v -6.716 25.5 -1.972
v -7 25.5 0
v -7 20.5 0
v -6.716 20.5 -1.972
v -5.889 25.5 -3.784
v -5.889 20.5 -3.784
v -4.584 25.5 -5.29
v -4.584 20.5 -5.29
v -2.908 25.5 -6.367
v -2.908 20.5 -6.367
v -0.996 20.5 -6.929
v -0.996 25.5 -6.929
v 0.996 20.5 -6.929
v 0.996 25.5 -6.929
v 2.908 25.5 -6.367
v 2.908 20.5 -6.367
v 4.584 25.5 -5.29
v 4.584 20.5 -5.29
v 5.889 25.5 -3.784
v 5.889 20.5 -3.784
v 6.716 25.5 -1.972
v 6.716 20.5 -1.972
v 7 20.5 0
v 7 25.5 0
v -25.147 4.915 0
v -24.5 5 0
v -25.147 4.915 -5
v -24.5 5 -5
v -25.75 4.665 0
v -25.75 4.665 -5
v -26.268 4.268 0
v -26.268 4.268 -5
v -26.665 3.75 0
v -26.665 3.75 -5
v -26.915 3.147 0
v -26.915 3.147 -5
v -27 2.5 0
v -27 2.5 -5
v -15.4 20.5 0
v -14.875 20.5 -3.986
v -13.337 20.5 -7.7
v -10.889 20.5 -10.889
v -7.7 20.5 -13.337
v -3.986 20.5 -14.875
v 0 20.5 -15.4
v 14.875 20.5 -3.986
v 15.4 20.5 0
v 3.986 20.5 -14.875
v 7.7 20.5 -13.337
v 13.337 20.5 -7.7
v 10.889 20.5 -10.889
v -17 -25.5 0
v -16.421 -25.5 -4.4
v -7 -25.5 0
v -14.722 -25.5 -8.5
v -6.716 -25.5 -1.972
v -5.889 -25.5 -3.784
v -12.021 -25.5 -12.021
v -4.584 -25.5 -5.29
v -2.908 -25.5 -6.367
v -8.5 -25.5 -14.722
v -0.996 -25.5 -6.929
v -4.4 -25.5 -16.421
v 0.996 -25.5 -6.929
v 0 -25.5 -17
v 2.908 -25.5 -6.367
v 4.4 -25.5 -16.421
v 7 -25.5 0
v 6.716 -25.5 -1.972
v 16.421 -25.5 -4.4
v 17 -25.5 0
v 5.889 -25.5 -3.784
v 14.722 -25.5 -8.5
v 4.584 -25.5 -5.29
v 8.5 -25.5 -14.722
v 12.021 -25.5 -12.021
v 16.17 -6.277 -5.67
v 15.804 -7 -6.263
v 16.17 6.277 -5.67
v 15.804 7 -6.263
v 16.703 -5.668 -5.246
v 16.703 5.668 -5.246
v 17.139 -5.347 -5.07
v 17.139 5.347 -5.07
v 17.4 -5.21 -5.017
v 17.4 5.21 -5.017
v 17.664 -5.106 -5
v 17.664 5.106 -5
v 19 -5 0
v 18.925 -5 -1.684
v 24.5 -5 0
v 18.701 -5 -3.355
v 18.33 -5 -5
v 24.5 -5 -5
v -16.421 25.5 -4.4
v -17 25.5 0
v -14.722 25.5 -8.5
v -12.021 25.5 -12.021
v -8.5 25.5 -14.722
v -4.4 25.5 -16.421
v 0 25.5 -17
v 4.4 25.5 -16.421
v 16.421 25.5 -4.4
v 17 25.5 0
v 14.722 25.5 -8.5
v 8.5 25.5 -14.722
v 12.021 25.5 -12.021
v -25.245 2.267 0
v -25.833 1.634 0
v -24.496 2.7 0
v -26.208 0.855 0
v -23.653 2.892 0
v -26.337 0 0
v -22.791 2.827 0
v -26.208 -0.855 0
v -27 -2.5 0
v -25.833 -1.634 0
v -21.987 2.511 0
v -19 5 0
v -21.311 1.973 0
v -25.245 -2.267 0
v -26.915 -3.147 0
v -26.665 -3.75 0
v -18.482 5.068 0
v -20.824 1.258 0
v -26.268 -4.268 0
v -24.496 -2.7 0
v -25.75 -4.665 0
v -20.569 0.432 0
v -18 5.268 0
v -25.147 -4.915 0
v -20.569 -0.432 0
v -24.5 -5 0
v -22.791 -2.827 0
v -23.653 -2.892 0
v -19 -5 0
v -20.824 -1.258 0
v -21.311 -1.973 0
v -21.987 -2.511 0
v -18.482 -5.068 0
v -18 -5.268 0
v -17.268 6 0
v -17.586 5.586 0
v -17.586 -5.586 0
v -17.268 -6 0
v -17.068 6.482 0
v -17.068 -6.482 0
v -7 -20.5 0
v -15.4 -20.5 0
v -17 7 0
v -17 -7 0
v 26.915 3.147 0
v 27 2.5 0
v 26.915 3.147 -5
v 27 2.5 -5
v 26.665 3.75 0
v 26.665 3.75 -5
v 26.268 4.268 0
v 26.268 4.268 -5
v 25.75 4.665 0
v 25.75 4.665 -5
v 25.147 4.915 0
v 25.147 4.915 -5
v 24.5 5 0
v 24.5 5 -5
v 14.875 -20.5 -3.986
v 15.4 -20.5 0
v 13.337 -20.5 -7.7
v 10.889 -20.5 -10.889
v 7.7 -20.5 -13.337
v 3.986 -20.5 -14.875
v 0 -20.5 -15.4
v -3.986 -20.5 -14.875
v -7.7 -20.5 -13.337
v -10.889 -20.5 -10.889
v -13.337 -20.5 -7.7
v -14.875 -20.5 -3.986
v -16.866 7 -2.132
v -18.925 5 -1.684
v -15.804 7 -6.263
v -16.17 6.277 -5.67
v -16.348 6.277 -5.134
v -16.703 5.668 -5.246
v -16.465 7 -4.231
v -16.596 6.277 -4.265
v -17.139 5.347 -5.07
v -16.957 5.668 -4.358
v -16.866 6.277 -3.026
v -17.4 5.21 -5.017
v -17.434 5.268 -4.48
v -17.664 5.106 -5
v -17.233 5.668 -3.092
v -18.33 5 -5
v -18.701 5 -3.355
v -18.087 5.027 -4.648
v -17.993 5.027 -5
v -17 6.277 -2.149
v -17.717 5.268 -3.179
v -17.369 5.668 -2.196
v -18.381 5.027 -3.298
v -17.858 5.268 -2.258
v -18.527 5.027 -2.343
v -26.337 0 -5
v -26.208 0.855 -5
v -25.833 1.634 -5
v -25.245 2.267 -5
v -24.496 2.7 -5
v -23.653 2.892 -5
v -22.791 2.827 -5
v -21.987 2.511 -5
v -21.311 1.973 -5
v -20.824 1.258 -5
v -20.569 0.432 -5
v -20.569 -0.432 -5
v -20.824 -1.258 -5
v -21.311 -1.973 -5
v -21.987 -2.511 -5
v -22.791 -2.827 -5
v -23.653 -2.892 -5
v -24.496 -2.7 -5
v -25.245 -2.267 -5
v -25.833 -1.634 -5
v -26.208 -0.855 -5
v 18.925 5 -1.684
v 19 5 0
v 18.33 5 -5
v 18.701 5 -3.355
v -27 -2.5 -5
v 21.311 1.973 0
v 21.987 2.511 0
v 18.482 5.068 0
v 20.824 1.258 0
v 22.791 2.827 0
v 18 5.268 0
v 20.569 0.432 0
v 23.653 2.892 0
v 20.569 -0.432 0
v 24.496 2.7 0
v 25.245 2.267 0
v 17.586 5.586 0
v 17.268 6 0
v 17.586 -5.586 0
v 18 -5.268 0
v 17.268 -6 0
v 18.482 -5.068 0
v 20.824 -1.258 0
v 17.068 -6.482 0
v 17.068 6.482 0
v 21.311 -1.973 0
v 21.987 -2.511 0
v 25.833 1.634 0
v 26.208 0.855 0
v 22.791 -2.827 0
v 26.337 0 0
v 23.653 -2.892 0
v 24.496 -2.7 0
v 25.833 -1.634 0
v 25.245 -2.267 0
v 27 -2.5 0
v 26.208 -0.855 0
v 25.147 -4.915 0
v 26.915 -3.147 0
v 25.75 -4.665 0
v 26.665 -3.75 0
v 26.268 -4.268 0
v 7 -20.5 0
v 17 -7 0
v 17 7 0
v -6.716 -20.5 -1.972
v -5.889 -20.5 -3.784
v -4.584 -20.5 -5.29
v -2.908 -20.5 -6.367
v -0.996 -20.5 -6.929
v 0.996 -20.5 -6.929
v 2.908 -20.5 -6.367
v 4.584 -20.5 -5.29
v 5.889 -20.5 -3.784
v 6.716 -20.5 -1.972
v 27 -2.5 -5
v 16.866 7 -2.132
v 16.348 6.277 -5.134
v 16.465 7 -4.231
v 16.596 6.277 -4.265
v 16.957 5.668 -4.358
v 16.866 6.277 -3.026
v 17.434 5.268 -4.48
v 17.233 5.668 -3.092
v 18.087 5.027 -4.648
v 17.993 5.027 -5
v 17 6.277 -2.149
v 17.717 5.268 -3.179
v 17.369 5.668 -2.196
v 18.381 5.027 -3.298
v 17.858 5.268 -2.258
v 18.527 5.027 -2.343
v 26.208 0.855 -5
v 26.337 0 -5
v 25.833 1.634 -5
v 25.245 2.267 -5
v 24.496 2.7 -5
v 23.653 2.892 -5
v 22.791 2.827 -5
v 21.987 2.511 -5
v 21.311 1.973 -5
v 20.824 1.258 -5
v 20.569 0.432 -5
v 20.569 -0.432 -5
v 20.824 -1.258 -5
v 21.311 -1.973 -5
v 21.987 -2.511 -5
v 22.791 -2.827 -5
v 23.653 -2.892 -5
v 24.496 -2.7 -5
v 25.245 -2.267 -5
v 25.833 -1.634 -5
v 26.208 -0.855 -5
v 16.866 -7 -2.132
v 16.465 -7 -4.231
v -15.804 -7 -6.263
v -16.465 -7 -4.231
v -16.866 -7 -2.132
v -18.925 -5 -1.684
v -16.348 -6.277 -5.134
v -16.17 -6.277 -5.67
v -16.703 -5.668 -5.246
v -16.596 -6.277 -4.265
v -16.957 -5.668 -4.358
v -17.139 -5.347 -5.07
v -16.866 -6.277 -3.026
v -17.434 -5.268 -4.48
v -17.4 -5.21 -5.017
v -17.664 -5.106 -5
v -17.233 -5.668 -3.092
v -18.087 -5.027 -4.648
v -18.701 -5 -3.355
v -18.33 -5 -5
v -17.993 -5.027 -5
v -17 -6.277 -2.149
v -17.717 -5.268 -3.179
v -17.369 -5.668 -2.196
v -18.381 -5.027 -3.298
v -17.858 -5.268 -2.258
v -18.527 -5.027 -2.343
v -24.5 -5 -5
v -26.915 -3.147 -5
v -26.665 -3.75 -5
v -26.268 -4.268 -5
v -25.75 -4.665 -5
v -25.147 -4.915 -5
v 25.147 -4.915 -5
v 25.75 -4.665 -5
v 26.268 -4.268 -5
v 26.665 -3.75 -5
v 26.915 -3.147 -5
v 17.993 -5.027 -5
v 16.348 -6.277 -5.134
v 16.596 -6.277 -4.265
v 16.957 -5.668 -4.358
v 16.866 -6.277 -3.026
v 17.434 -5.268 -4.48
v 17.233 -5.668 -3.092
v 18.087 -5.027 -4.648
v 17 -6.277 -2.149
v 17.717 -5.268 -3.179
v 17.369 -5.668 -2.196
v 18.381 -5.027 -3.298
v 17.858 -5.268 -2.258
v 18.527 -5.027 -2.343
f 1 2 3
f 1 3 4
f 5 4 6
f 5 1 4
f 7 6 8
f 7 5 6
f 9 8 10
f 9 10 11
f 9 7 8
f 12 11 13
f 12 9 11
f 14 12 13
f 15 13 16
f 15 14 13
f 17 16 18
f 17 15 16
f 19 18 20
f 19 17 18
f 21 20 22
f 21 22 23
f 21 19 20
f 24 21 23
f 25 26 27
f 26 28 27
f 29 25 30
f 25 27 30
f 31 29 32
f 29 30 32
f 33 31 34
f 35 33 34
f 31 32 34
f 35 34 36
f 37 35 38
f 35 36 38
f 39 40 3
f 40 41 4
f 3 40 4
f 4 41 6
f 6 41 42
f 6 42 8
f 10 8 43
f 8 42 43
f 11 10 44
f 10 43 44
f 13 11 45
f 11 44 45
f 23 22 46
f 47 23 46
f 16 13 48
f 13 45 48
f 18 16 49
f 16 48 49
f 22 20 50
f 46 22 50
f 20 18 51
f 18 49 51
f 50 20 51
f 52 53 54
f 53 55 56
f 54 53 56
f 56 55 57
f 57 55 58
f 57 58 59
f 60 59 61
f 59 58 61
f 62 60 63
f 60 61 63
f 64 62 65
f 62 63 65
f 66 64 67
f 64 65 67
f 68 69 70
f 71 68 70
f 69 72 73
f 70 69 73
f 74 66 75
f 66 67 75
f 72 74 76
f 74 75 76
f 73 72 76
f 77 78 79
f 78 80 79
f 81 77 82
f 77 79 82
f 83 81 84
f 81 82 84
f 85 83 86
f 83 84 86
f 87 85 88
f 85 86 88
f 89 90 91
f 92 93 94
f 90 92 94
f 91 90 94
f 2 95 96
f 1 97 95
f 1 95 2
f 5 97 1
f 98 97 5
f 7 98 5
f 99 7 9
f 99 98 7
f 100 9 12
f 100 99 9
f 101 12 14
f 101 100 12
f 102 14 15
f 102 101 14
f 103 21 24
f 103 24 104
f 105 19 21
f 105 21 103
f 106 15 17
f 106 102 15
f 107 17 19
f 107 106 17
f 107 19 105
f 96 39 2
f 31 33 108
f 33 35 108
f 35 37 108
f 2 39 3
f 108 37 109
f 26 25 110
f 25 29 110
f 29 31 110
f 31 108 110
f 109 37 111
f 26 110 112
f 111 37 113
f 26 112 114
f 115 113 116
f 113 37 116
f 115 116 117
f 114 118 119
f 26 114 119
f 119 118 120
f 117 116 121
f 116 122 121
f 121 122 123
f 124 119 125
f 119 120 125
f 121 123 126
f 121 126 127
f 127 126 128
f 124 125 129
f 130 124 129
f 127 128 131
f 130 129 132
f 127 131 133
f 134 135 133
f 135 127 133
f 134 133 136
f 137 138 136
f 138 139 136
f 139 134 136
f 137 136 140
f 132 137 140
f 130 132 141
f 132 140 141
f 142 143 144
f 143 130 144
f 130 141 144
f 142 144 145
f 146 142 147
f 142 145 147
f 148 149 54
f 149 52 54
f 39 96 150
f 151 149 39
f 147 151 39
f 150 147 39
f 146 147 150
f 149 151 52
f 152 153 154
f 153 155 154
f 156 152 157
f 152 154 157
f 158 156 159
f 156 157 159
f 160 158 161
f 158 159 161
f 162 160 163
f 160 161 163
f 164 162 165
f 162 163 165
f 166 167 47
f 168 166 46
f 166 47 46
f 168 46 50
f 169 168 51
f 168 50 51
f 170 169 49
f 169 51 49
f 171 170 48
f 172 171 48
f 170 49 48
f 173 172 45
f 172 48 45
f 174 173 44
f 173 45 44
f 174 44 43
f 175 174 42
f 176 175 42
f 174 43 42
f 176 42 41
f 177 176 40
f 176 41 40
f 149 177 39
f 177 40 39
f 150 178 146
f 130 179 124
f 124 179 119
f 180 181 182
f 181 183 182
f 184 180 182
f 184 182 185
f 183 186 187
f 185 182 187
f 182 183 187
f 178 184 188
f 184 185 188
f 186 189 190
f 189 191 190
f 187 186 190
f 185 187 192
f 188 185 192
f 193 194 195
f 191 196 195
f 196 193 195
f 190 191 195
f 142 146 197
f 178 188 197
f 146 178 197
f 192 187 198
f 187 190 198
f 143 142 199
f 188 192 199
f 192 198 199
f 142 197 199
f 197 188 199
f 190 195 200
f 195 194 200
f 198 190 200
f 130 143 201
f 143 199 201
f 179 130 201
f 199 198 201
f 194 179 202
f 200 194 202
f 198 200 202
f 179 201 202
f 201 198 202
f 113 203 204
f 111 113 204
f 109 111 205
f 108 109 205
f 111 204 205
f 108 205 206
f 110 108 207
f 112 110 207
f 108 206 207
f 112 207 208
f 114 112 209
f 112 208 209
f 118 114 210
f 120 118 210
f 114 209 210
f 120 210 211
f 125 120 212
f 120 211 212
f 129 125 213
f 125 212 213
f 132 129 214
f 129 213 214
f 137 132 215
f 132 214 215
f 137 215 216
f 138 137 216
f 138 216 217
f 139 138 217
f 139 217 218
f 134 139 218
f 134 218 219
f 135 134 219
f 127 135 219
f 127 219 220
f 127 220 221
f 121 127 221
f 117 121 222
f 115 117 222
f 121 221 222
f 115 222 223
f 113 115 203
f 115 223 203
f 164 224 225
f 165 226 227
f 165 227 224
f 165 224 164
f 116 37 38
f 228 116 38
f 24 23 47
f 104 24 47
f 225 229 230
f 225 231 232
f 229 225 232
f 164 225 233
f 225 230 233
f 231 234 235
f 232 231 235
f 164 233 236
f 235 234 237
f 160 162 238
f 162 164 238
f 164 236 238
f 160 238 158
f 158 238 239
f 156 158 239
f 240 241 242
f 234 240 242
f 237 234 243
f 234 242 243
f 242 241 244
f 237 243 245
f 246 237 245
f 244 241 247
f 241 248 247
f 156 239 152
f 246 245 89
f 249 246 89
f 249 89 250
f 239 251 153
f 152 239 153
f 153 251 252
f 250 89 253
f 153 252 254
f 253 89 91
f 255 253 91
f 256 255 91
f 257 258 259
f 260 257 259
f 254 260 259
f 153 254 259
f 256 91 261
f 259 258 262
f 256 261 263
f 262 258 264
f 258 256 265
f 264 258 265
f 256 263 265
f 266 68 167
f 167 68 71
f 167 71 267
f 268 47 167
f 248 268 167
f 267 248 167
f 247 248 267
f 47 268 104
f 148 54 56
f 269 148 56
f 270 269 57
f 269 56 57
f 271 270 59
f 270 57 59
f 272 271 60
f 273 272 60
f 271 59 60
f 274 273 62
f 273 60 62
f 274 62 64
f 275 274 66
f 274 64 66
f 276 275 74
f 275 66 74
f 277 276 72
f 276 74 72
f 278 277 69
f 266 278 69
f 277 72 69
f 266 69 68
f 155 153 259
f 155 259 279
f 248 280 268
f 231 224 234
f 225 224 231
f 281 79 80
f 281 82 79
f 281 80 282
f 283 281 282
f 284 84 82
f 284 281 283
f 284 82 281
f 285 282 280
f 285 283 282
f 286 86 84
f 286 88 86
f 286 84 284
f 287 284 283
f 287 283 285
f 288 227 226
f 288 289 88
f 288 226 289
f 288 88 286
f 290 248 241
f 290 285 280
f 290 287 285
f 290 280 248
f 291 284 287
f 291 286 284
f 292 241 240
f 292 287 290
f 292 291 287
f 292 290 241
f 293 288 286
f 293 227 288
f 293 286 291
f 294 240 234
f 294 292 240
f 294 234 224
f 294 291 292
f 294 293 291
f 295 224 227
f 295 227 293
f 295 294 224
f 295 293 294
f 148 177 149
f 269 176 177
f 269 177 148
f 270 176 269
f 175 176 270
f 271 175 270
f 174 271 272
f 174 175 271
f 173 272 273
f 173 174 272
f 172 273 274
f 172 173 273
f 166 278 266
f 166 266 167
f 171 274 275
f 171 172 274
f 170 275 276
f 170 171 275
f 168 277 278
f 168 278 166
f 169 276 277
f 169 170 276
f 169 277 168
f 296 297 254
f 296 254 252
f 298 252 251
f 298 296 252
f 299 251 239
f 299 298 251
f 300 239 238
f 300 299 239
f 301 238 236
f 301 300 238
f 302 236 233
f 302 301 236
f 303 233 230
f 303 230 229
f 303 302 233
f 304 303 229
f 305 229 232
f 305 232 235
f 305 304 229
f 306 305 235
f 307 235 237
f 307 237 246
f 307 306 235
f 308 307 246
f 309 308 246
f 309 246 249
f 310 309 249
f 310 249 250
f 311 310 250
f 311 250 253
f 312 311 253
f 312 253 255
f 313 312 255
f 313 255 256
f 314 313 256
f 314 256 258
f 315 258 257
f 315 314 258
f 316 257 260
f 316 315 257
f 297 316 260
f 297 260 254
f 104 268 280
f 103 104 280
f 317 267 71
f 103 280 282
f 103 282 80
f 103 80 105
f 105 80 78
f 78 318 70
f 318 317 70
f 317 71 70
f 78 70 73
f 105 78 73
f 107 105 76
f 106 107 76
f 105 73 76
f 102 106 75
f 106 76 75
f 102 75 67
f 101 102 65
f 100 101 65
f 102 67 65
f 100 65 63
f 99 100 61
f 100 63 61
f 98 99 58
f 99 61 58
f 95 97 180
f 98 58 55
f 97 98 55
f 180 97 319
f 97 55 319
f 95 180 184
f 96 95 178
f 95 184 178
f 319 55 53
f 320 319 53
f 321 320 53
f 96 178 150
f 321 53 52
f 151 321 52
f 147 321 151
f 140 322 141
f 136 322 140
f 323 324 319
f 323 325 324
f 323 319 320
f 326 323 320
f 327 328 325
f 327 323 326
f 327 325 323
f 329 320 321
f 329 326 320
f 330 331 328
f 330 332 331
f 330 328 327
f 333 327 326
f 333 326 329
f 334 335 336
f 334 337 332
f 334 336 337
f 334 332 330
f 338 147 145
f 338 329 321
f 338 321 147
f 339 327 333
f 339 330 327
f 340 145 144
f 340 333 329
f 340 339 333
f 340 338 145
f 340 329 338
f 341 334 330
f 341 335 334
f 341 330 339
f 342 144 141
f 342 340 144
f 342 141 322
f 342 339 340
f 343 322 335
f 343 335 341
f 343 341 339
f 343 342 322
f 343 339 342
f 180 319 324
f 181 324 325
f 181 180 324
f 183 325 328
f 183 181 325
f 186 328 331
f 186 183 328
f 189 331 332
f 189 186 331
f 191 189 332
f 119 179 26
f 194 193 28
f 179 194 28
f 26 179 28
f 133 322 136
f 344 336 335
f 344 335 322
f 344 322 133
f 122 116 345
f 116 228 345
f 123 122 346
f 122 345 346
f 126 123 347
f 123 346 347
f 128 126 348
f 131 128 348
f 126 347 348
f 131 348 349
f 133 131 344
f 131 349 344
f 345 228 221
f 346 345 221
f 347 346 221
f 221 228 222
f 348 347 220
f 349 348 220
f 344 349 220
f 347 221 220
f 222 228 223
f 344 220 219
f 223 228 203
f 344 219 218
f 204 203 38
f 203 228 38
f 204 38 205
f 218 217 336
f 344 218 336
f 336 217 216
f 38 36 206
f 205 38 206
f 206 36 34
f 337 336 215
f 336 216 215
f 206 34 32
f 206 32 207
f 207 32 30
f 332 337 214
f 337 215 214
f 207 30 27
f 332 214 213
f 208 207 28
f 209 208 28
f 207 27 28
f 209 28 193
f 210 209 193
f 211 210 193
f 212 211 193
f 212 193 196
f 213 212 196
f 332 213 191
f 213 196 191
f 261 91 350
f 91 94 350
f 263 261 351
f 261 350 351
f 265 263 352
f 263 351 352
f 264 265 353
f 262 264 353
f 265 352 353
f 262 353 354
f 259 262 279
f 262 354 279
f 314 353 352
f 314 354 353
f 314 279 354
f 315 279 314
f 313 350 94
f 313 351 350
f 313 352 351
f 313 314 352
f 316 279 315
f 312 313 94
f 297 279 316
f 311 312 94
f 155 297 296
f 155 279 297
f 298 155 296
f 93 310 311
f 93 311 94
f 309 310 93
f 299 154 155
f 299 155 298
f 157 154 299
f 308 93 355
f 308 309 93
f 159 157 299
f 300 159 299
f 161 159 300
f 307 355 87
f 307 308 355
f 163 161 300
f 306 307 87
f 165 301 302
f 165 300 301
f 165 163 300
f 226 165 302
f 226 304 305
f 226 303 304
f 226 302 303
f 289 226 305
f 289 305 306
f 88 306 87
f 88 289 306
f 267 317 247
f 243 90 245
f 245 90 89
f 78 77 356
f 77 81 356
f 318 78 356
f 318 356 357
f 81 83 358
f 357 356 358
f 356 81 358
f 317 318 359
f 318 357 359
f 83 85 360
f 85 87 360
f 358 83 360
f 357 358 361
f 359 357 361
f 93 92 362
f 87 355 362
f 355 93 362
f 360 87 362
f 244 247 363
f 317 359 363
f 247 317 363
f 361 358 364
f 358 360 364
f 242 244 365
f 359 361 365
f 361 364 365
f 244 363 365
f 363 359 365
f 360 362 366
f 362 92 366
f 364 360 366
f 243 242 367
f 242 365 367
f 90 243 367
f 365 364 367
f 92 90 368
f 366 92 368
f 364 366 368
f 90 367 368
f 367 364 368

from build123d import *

# Parameters (mm, degrees)
BOSS_EXTRUDE1_DEPTH  = 20.5
BOSS_EXTRUDE2_START  = 5
BOSS_EXTRUDE2_DEPTH  = 5
BOSS_EXTRUDE3_DEPTH  = 5
FILLET1_R            = 2
SKETCH8_R            = 2.9
CUT_EXTRUDE4_DEPTH   = 5
FILLET1_OF_MIRROR3_R = 2
FILLET2_R            = 2.5


with BuildPart() as part:
    # Sketch1 → Boss-Extrude1 (new, symmetric)
    with BuildSketch(Plane(origin=(0, 0, 0), x_dir=(1, 0, 0), z_dir=(0, 1, 0))):
        with BuildLine():
            Line((-15.4, 0), (-17, 0))
            ThreePointArc((-17, 0), (0, 17), (17, 0))
            Line((17, 0), (15.4, 0))
            ThreePointArc((15.4, 0), (0, 15.4), (-15.4, 0))
        make_face()
    extrude(amount=BOSS_EXTRUDE1_DEPTH, both=True)

    # Sketch6 → Boss-Extrude2 (add)
    with BuildSketch(Plane(origin=(0, 20.5, 0), x_dir=(1, 0, 0), z_dir=(0, 1, 0)).offset(BOSS_EXTRUDE2_START)):
        with BuildLine():
            Line((-17, 0), (-7, 0))
            ThreePointArc((-7, 0), (0, 7), (7, 0))
            Line((7, 0), (17, 0))
            ThreePointArc((17, 0), (0, 17), (-17, 0))
        make_face()
    boss_extrude2 = extrude(amount=-BOSS_EXTRUDE2_DEPTH)

    # Mirror1: Boss-Extrude2 across plane
    add(boss_extrude2.mirror(Plane.ZX))

    # Sketch7 → Boss-Extrude3 (add, symmetric)
    with BuildSketch(Plane(origin=(0, 0, 0), x_dir=(1, 0, 0), z_dir=(0, 1, 0))):
        with BuildLine():
            Line((-17, 0), (-27, 0))
            Line((-27, 0), (-27, 5))
            Line((-27, 5), (-16.248076809, 5))
            ThreePointArc((-16.248076809, 5), (-16.810968231, 2.528111374), (-17, 0))
        make_face()
    boss_extrude3 = extrude(amount=BOSS_EXTRUDE3_DEPTH, both=True)

    # Fillet1
    fillet1_edges = [part.edges().sort_by_distance(p)[0] for p in [
        (-16.810968231, -5, -2.528111374),
        (-16.248076809, 0, -5),
        (-16.810968231, 5, -2.528111374),
    ]]
    fillet(fillet1_edges, radius=FILLET1_R)

    # Sketch8 → Cut-Extrude4 (cut, symmetric)
    with BuildSketch(Plane(origin=(0, 0, -5), x_dir=(-1, 0, 0), z_dir=(0, 0, -1))):
        with Locations((23.436686237, 0)):
            Circle(SKETCH8_R)
    cut_extrude4 = extrude(amount=CUT_EXTRUDE4_DEPTH, both=True, mode=Mode.SUBTRACT)

    # Mirror3: Boss-Extrude3, Cut-Extrude4 across plane
    add(boss_extrude3.mirror(Plane(origin=(0, 0, 0), x_dir=(0, 0, 1), z_dir=(1, 0, 0))))
    add(cut_extrude4.mirror(Plane(origin=(0, 0, 0), x_dir=(0, 0, 1), z_dir=(1, 0, 0))), mode=Mode.SUBTRACT)

    # Fillet1 of Mirror3
    fillet1_of_mirror3_edges = [part.edges().sort_by_distance(p)[0] for p in [
        (16.810968231, -5, -2.528111374),
        (16.248076809, 0, -5),
        (16.810968231, 5, -2.528111374),
    ]]
    fillet(fillet1_of_mirror3_edges, radius=FILLET1_OF_MIRROR3_R)

    # Fillet2
    fillet2_edges = [part.edges().sort_by_distance(p)[0] for p in [
        (-27, -5, -2.5),
        (-27, 5, -2.5),
        (27, 5, -2.5),
        (27, -5, -2.5),
    ]]
    fillet(fillet2_edges, radius=FILLET2_R)


solid = part.part
